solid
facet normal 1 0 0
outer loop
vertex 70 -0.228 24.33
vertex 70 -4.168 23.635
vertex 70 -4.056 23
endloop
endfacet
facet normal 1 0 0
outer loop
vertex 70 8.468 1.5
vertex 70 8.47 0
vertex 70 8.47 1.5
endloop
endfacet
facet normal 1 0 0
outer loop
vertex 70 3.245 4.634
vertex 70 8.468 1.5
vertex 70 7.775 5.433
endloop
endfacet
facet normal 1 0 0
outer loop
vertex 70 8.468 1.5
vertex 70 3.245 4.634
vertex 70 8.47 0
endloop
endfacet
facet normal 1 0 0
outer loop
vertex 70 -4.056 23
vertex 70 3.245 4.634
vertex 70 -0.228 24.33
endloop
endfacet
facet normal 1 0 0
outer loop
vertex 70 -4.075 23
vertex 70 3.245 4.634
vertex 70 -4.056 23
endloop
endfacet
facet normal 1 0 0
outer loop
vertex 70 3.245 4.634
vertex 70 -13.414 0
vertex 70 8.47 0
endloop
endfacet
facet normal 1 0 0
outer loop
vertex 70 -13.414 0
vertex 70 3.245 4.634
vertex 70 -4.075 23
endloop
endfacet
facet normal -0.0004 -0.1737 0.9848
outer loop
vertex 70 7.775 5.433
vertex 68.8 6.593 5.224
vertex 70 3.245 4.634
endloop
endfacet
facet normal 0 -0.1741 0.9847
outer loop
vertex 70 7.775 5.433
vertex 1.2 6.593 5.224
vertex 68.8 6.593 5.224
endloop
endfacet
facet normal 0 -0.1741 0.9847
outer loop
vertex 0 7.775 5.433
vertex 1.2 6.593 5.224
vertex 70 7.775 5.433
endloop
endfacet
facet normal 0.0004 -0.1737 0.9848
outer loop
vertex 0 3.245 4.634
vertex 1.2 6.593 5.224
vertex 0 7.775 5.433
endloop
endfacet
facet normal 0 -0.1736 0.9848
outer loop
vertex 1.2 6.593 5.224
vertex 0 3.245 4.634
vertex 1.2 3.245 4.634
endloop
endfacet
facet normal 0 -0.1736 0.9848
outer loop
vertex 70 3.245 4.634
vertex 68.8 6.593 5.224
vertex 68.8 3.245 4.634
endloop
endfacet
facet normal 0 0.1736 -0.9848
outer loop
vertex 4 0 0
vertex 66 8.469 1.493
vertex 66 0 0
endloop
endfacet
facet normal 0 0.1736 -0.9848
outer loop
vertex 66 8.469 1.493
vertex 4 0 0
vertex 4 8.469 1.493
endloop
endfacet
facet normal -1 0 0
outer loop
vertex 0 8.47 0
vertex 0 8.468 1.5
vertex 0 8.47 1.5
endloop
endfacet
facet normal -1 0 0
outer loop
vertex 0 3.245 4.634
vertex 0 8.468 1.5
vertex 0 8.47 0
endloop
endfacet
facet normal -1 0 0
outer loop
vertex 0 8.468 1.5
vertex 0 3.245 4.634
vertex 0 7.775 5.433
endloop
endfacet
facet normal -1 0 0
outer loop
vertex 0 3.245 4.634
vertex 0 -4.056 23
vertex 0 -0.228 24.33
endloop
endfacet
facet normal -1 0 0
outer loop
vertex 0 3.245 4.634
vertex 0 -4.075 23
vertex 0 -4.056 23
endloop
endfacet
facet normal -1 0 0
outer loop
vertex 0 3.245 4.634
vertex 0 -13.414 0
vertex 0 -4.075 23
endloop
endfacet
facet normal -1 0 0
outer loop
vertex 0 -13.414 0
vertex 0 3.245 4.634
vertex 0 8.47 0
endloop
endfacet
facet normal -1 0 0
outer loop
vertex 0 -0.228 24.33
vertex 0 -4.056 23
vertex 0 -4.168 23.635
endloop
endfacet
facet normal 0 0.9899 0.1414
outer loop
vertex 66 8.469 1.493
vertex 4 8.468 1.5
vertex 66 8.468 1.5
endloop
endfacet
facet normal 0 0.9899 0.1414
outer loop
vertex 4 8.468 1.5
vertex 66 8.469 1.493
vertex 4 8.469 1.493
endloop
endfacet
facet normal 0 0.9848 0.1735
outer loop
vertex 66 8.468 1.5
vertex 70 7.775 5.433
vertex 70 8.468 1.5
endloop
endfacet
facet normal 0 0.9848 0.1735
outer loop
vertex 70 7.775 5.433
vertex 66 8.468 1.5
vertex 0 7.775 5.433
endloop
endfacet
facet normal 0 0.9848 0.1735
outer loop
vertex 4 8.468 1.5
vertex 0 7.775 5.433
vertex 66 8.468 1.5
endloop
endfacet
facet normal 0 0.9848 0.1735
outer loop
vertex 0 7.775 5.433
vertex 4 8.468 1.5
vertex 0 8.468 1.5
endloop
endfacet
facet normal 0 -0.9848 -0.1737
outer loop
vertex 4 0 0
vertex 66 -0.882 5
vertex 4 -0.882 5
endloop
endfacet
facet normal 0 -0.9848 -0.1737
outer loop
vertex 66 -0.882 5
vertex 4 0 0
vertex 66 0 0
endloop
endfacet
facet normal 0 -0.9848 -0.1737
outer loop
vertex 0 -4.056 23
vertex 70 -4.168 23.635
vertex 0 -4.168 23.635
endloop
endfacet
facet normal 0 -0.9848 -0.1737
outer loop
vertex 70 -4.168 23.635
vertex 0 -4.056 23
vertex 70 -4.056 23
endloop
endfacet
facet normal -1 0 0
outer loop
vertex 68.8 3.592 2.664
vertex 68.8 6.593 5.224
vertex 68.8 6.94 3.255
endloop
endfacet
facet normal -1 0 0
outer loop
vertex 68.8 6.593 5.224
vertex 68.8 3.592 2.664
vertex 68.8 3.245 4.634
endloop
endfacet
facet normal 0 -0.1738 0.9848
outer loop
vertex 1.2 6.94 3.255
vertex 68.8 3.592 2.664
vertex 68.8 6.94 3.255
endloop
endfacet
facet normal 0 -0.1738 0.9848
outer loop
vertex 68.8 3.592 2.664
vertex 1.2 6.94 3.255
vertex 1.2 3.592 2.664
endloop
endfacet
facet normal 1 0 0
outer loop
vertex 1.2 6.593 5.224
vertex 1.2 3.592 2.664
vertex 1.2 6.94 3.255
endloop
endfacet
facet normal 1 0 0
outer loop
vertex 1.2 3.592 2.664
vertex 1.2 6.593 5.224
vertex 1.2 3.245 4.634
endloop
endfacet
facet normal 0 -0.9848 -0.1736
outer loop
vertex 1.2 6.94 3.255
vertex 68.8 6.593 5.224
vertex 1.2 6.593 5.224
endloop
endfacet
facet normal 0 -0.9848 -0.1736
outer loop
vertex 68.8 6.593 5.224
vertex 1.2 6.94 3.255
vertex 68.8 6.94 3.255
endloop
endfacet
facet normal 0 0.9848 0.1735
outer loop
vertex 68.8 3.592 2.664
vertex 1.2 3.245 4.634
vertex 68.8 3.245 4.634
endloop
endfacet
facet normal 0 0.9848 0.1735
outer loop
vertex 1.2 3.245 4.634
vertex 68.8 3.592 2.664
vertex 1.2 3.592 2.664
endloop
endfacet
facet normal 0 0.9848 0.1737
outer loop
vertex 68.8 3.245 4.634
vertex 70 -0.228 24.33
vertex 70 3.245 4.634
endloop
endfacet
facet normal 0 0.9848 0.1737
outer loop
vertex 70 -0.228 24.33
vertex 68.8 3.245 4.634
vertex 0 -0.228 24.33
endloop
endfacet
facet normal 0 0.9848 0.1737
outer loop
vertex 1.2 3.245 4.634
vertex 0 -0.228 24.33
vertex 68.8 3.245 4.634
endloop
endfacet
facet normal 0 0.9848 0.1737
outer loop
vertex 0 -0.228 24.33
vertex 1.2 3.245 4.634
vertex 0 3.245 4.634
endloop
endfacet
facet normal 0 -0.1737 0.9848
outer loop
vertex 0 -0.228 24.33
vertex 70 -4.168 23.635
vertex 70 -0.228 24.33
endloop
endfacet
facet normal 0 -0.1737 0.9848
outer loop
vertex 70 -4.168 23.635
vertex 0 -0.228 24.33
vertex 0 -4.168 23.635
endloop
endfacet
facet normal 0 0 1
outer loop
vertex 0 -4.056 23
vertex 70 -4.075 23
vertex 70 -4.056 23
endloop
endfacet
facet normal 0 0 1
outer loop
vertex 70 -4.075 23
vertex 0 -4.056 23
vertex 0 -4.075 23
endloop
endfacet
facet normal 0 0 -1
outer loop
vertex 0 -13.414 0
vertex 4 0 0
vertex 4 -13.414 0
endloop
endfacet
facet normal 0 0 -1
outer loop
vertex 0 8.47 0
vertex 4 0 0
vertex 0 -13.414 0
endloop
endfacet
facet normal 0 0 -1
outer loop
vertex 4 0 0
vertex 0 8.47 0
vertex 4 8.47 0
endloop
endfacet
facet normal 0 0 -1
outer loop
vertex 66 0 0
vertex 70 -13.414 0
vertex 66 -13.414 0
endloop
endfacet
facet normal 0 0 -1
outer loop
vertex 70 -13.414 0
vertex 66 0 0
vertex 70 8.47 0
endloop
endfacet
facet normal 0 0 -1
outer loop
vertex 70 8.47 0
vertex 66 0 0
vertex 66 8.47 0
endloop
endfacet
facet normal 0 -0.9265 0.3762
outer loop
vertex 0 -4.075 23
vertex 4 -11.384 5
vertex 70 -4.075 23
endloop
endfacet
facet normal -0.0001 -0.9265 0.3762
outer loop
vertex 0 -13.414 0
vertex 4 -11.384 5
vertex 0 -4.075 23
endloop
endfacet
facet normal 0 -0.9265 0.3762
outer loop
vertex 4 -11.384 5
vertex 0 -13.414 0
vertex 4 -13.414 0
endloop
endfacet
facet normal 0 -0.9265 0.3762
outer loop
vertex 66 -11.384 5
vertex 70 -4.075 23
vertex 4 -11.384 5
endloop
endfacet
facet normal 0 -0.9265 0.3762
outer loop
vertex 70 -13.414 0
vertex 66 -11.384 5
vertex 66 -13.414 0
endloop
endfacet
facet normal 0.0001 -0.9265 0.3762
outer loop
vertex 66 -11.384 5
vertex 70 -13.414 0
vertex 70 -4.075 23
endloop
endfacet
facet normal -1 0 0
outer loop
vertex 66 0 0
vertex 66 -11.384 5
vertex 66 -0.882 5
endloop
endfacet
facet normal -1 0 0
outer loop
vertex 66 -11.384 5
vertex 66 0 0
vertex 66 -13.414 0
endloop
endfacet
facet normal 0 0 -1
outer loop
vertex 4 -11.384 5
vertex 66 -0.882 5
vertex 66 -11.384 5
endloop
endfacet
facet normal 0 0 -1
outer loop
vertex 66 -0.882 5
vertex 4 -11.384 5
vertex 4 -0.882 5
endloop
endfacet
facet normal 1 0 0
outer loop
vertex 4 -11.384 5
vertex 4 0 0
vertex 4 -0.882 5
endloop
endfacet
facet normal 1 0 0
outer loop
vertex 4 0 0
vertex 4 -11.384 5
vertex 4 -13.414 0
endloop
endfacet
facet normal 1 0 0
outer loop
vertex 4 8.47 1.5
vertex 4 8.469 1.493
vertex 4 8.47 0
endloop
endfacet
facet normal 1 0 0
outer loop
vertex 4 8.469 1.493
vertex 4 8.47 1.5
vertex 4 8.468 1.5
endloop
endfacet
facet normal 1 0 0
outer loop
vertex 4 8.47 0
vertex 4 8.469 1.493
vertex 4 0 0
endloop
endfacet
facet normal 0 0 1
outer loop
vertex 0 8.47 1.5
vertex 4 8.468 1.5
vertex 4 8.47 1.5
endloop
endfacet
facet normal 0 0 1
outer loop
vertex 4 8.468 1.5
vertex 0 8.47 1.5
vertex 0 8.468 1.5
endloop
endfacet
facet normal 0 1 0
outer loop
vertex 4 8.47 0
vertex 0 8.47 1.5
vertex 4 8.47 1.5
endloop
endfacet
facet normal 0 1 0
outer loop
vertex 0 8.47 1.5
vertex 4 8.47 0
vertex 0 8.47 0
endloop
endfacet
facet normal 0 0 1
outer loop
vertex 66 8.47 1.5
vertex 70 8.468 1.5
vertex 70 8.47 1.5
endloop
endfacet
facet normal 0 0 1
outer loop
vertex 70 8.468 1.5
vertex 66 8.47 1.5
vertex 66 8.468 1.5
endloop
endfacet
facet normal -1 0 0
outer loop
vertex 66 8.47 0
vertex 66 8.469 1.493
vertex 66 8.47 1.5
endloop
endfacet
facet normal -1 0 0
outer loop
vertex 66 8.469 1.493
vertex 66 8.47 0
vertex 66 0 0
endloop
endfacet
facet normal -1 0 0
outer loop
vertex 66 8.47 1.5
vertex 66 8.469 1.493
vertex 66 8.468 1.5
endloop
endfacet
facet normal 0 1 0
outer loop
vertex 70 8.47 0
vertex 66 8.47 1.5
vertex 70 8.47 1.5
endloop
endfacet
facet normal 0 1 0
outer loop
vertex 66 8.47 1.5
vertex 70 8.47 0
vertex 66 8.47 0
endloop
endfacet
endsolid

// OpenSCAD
rotate([10,0,0]) {
    cube([70,4,24]);
    difference() {
        cube([70,8.6,4]);
        translate([1.2,4,2]) cube([70-1.2*2,3.4,4]);
    }
}

difference() {
            translate([0,-15,0]) cube([70,15,23]);
            translate([-1,-35,0]) rotate([-22.1,0,0]) cube([72,20,50]);
            translate([4,-15,-1]) cube([62,30,6]);
}
        
for(i=[0,66]) {
    translate([i,0,0]) {
        cube([4,8.47,1.5]);
    }
}
